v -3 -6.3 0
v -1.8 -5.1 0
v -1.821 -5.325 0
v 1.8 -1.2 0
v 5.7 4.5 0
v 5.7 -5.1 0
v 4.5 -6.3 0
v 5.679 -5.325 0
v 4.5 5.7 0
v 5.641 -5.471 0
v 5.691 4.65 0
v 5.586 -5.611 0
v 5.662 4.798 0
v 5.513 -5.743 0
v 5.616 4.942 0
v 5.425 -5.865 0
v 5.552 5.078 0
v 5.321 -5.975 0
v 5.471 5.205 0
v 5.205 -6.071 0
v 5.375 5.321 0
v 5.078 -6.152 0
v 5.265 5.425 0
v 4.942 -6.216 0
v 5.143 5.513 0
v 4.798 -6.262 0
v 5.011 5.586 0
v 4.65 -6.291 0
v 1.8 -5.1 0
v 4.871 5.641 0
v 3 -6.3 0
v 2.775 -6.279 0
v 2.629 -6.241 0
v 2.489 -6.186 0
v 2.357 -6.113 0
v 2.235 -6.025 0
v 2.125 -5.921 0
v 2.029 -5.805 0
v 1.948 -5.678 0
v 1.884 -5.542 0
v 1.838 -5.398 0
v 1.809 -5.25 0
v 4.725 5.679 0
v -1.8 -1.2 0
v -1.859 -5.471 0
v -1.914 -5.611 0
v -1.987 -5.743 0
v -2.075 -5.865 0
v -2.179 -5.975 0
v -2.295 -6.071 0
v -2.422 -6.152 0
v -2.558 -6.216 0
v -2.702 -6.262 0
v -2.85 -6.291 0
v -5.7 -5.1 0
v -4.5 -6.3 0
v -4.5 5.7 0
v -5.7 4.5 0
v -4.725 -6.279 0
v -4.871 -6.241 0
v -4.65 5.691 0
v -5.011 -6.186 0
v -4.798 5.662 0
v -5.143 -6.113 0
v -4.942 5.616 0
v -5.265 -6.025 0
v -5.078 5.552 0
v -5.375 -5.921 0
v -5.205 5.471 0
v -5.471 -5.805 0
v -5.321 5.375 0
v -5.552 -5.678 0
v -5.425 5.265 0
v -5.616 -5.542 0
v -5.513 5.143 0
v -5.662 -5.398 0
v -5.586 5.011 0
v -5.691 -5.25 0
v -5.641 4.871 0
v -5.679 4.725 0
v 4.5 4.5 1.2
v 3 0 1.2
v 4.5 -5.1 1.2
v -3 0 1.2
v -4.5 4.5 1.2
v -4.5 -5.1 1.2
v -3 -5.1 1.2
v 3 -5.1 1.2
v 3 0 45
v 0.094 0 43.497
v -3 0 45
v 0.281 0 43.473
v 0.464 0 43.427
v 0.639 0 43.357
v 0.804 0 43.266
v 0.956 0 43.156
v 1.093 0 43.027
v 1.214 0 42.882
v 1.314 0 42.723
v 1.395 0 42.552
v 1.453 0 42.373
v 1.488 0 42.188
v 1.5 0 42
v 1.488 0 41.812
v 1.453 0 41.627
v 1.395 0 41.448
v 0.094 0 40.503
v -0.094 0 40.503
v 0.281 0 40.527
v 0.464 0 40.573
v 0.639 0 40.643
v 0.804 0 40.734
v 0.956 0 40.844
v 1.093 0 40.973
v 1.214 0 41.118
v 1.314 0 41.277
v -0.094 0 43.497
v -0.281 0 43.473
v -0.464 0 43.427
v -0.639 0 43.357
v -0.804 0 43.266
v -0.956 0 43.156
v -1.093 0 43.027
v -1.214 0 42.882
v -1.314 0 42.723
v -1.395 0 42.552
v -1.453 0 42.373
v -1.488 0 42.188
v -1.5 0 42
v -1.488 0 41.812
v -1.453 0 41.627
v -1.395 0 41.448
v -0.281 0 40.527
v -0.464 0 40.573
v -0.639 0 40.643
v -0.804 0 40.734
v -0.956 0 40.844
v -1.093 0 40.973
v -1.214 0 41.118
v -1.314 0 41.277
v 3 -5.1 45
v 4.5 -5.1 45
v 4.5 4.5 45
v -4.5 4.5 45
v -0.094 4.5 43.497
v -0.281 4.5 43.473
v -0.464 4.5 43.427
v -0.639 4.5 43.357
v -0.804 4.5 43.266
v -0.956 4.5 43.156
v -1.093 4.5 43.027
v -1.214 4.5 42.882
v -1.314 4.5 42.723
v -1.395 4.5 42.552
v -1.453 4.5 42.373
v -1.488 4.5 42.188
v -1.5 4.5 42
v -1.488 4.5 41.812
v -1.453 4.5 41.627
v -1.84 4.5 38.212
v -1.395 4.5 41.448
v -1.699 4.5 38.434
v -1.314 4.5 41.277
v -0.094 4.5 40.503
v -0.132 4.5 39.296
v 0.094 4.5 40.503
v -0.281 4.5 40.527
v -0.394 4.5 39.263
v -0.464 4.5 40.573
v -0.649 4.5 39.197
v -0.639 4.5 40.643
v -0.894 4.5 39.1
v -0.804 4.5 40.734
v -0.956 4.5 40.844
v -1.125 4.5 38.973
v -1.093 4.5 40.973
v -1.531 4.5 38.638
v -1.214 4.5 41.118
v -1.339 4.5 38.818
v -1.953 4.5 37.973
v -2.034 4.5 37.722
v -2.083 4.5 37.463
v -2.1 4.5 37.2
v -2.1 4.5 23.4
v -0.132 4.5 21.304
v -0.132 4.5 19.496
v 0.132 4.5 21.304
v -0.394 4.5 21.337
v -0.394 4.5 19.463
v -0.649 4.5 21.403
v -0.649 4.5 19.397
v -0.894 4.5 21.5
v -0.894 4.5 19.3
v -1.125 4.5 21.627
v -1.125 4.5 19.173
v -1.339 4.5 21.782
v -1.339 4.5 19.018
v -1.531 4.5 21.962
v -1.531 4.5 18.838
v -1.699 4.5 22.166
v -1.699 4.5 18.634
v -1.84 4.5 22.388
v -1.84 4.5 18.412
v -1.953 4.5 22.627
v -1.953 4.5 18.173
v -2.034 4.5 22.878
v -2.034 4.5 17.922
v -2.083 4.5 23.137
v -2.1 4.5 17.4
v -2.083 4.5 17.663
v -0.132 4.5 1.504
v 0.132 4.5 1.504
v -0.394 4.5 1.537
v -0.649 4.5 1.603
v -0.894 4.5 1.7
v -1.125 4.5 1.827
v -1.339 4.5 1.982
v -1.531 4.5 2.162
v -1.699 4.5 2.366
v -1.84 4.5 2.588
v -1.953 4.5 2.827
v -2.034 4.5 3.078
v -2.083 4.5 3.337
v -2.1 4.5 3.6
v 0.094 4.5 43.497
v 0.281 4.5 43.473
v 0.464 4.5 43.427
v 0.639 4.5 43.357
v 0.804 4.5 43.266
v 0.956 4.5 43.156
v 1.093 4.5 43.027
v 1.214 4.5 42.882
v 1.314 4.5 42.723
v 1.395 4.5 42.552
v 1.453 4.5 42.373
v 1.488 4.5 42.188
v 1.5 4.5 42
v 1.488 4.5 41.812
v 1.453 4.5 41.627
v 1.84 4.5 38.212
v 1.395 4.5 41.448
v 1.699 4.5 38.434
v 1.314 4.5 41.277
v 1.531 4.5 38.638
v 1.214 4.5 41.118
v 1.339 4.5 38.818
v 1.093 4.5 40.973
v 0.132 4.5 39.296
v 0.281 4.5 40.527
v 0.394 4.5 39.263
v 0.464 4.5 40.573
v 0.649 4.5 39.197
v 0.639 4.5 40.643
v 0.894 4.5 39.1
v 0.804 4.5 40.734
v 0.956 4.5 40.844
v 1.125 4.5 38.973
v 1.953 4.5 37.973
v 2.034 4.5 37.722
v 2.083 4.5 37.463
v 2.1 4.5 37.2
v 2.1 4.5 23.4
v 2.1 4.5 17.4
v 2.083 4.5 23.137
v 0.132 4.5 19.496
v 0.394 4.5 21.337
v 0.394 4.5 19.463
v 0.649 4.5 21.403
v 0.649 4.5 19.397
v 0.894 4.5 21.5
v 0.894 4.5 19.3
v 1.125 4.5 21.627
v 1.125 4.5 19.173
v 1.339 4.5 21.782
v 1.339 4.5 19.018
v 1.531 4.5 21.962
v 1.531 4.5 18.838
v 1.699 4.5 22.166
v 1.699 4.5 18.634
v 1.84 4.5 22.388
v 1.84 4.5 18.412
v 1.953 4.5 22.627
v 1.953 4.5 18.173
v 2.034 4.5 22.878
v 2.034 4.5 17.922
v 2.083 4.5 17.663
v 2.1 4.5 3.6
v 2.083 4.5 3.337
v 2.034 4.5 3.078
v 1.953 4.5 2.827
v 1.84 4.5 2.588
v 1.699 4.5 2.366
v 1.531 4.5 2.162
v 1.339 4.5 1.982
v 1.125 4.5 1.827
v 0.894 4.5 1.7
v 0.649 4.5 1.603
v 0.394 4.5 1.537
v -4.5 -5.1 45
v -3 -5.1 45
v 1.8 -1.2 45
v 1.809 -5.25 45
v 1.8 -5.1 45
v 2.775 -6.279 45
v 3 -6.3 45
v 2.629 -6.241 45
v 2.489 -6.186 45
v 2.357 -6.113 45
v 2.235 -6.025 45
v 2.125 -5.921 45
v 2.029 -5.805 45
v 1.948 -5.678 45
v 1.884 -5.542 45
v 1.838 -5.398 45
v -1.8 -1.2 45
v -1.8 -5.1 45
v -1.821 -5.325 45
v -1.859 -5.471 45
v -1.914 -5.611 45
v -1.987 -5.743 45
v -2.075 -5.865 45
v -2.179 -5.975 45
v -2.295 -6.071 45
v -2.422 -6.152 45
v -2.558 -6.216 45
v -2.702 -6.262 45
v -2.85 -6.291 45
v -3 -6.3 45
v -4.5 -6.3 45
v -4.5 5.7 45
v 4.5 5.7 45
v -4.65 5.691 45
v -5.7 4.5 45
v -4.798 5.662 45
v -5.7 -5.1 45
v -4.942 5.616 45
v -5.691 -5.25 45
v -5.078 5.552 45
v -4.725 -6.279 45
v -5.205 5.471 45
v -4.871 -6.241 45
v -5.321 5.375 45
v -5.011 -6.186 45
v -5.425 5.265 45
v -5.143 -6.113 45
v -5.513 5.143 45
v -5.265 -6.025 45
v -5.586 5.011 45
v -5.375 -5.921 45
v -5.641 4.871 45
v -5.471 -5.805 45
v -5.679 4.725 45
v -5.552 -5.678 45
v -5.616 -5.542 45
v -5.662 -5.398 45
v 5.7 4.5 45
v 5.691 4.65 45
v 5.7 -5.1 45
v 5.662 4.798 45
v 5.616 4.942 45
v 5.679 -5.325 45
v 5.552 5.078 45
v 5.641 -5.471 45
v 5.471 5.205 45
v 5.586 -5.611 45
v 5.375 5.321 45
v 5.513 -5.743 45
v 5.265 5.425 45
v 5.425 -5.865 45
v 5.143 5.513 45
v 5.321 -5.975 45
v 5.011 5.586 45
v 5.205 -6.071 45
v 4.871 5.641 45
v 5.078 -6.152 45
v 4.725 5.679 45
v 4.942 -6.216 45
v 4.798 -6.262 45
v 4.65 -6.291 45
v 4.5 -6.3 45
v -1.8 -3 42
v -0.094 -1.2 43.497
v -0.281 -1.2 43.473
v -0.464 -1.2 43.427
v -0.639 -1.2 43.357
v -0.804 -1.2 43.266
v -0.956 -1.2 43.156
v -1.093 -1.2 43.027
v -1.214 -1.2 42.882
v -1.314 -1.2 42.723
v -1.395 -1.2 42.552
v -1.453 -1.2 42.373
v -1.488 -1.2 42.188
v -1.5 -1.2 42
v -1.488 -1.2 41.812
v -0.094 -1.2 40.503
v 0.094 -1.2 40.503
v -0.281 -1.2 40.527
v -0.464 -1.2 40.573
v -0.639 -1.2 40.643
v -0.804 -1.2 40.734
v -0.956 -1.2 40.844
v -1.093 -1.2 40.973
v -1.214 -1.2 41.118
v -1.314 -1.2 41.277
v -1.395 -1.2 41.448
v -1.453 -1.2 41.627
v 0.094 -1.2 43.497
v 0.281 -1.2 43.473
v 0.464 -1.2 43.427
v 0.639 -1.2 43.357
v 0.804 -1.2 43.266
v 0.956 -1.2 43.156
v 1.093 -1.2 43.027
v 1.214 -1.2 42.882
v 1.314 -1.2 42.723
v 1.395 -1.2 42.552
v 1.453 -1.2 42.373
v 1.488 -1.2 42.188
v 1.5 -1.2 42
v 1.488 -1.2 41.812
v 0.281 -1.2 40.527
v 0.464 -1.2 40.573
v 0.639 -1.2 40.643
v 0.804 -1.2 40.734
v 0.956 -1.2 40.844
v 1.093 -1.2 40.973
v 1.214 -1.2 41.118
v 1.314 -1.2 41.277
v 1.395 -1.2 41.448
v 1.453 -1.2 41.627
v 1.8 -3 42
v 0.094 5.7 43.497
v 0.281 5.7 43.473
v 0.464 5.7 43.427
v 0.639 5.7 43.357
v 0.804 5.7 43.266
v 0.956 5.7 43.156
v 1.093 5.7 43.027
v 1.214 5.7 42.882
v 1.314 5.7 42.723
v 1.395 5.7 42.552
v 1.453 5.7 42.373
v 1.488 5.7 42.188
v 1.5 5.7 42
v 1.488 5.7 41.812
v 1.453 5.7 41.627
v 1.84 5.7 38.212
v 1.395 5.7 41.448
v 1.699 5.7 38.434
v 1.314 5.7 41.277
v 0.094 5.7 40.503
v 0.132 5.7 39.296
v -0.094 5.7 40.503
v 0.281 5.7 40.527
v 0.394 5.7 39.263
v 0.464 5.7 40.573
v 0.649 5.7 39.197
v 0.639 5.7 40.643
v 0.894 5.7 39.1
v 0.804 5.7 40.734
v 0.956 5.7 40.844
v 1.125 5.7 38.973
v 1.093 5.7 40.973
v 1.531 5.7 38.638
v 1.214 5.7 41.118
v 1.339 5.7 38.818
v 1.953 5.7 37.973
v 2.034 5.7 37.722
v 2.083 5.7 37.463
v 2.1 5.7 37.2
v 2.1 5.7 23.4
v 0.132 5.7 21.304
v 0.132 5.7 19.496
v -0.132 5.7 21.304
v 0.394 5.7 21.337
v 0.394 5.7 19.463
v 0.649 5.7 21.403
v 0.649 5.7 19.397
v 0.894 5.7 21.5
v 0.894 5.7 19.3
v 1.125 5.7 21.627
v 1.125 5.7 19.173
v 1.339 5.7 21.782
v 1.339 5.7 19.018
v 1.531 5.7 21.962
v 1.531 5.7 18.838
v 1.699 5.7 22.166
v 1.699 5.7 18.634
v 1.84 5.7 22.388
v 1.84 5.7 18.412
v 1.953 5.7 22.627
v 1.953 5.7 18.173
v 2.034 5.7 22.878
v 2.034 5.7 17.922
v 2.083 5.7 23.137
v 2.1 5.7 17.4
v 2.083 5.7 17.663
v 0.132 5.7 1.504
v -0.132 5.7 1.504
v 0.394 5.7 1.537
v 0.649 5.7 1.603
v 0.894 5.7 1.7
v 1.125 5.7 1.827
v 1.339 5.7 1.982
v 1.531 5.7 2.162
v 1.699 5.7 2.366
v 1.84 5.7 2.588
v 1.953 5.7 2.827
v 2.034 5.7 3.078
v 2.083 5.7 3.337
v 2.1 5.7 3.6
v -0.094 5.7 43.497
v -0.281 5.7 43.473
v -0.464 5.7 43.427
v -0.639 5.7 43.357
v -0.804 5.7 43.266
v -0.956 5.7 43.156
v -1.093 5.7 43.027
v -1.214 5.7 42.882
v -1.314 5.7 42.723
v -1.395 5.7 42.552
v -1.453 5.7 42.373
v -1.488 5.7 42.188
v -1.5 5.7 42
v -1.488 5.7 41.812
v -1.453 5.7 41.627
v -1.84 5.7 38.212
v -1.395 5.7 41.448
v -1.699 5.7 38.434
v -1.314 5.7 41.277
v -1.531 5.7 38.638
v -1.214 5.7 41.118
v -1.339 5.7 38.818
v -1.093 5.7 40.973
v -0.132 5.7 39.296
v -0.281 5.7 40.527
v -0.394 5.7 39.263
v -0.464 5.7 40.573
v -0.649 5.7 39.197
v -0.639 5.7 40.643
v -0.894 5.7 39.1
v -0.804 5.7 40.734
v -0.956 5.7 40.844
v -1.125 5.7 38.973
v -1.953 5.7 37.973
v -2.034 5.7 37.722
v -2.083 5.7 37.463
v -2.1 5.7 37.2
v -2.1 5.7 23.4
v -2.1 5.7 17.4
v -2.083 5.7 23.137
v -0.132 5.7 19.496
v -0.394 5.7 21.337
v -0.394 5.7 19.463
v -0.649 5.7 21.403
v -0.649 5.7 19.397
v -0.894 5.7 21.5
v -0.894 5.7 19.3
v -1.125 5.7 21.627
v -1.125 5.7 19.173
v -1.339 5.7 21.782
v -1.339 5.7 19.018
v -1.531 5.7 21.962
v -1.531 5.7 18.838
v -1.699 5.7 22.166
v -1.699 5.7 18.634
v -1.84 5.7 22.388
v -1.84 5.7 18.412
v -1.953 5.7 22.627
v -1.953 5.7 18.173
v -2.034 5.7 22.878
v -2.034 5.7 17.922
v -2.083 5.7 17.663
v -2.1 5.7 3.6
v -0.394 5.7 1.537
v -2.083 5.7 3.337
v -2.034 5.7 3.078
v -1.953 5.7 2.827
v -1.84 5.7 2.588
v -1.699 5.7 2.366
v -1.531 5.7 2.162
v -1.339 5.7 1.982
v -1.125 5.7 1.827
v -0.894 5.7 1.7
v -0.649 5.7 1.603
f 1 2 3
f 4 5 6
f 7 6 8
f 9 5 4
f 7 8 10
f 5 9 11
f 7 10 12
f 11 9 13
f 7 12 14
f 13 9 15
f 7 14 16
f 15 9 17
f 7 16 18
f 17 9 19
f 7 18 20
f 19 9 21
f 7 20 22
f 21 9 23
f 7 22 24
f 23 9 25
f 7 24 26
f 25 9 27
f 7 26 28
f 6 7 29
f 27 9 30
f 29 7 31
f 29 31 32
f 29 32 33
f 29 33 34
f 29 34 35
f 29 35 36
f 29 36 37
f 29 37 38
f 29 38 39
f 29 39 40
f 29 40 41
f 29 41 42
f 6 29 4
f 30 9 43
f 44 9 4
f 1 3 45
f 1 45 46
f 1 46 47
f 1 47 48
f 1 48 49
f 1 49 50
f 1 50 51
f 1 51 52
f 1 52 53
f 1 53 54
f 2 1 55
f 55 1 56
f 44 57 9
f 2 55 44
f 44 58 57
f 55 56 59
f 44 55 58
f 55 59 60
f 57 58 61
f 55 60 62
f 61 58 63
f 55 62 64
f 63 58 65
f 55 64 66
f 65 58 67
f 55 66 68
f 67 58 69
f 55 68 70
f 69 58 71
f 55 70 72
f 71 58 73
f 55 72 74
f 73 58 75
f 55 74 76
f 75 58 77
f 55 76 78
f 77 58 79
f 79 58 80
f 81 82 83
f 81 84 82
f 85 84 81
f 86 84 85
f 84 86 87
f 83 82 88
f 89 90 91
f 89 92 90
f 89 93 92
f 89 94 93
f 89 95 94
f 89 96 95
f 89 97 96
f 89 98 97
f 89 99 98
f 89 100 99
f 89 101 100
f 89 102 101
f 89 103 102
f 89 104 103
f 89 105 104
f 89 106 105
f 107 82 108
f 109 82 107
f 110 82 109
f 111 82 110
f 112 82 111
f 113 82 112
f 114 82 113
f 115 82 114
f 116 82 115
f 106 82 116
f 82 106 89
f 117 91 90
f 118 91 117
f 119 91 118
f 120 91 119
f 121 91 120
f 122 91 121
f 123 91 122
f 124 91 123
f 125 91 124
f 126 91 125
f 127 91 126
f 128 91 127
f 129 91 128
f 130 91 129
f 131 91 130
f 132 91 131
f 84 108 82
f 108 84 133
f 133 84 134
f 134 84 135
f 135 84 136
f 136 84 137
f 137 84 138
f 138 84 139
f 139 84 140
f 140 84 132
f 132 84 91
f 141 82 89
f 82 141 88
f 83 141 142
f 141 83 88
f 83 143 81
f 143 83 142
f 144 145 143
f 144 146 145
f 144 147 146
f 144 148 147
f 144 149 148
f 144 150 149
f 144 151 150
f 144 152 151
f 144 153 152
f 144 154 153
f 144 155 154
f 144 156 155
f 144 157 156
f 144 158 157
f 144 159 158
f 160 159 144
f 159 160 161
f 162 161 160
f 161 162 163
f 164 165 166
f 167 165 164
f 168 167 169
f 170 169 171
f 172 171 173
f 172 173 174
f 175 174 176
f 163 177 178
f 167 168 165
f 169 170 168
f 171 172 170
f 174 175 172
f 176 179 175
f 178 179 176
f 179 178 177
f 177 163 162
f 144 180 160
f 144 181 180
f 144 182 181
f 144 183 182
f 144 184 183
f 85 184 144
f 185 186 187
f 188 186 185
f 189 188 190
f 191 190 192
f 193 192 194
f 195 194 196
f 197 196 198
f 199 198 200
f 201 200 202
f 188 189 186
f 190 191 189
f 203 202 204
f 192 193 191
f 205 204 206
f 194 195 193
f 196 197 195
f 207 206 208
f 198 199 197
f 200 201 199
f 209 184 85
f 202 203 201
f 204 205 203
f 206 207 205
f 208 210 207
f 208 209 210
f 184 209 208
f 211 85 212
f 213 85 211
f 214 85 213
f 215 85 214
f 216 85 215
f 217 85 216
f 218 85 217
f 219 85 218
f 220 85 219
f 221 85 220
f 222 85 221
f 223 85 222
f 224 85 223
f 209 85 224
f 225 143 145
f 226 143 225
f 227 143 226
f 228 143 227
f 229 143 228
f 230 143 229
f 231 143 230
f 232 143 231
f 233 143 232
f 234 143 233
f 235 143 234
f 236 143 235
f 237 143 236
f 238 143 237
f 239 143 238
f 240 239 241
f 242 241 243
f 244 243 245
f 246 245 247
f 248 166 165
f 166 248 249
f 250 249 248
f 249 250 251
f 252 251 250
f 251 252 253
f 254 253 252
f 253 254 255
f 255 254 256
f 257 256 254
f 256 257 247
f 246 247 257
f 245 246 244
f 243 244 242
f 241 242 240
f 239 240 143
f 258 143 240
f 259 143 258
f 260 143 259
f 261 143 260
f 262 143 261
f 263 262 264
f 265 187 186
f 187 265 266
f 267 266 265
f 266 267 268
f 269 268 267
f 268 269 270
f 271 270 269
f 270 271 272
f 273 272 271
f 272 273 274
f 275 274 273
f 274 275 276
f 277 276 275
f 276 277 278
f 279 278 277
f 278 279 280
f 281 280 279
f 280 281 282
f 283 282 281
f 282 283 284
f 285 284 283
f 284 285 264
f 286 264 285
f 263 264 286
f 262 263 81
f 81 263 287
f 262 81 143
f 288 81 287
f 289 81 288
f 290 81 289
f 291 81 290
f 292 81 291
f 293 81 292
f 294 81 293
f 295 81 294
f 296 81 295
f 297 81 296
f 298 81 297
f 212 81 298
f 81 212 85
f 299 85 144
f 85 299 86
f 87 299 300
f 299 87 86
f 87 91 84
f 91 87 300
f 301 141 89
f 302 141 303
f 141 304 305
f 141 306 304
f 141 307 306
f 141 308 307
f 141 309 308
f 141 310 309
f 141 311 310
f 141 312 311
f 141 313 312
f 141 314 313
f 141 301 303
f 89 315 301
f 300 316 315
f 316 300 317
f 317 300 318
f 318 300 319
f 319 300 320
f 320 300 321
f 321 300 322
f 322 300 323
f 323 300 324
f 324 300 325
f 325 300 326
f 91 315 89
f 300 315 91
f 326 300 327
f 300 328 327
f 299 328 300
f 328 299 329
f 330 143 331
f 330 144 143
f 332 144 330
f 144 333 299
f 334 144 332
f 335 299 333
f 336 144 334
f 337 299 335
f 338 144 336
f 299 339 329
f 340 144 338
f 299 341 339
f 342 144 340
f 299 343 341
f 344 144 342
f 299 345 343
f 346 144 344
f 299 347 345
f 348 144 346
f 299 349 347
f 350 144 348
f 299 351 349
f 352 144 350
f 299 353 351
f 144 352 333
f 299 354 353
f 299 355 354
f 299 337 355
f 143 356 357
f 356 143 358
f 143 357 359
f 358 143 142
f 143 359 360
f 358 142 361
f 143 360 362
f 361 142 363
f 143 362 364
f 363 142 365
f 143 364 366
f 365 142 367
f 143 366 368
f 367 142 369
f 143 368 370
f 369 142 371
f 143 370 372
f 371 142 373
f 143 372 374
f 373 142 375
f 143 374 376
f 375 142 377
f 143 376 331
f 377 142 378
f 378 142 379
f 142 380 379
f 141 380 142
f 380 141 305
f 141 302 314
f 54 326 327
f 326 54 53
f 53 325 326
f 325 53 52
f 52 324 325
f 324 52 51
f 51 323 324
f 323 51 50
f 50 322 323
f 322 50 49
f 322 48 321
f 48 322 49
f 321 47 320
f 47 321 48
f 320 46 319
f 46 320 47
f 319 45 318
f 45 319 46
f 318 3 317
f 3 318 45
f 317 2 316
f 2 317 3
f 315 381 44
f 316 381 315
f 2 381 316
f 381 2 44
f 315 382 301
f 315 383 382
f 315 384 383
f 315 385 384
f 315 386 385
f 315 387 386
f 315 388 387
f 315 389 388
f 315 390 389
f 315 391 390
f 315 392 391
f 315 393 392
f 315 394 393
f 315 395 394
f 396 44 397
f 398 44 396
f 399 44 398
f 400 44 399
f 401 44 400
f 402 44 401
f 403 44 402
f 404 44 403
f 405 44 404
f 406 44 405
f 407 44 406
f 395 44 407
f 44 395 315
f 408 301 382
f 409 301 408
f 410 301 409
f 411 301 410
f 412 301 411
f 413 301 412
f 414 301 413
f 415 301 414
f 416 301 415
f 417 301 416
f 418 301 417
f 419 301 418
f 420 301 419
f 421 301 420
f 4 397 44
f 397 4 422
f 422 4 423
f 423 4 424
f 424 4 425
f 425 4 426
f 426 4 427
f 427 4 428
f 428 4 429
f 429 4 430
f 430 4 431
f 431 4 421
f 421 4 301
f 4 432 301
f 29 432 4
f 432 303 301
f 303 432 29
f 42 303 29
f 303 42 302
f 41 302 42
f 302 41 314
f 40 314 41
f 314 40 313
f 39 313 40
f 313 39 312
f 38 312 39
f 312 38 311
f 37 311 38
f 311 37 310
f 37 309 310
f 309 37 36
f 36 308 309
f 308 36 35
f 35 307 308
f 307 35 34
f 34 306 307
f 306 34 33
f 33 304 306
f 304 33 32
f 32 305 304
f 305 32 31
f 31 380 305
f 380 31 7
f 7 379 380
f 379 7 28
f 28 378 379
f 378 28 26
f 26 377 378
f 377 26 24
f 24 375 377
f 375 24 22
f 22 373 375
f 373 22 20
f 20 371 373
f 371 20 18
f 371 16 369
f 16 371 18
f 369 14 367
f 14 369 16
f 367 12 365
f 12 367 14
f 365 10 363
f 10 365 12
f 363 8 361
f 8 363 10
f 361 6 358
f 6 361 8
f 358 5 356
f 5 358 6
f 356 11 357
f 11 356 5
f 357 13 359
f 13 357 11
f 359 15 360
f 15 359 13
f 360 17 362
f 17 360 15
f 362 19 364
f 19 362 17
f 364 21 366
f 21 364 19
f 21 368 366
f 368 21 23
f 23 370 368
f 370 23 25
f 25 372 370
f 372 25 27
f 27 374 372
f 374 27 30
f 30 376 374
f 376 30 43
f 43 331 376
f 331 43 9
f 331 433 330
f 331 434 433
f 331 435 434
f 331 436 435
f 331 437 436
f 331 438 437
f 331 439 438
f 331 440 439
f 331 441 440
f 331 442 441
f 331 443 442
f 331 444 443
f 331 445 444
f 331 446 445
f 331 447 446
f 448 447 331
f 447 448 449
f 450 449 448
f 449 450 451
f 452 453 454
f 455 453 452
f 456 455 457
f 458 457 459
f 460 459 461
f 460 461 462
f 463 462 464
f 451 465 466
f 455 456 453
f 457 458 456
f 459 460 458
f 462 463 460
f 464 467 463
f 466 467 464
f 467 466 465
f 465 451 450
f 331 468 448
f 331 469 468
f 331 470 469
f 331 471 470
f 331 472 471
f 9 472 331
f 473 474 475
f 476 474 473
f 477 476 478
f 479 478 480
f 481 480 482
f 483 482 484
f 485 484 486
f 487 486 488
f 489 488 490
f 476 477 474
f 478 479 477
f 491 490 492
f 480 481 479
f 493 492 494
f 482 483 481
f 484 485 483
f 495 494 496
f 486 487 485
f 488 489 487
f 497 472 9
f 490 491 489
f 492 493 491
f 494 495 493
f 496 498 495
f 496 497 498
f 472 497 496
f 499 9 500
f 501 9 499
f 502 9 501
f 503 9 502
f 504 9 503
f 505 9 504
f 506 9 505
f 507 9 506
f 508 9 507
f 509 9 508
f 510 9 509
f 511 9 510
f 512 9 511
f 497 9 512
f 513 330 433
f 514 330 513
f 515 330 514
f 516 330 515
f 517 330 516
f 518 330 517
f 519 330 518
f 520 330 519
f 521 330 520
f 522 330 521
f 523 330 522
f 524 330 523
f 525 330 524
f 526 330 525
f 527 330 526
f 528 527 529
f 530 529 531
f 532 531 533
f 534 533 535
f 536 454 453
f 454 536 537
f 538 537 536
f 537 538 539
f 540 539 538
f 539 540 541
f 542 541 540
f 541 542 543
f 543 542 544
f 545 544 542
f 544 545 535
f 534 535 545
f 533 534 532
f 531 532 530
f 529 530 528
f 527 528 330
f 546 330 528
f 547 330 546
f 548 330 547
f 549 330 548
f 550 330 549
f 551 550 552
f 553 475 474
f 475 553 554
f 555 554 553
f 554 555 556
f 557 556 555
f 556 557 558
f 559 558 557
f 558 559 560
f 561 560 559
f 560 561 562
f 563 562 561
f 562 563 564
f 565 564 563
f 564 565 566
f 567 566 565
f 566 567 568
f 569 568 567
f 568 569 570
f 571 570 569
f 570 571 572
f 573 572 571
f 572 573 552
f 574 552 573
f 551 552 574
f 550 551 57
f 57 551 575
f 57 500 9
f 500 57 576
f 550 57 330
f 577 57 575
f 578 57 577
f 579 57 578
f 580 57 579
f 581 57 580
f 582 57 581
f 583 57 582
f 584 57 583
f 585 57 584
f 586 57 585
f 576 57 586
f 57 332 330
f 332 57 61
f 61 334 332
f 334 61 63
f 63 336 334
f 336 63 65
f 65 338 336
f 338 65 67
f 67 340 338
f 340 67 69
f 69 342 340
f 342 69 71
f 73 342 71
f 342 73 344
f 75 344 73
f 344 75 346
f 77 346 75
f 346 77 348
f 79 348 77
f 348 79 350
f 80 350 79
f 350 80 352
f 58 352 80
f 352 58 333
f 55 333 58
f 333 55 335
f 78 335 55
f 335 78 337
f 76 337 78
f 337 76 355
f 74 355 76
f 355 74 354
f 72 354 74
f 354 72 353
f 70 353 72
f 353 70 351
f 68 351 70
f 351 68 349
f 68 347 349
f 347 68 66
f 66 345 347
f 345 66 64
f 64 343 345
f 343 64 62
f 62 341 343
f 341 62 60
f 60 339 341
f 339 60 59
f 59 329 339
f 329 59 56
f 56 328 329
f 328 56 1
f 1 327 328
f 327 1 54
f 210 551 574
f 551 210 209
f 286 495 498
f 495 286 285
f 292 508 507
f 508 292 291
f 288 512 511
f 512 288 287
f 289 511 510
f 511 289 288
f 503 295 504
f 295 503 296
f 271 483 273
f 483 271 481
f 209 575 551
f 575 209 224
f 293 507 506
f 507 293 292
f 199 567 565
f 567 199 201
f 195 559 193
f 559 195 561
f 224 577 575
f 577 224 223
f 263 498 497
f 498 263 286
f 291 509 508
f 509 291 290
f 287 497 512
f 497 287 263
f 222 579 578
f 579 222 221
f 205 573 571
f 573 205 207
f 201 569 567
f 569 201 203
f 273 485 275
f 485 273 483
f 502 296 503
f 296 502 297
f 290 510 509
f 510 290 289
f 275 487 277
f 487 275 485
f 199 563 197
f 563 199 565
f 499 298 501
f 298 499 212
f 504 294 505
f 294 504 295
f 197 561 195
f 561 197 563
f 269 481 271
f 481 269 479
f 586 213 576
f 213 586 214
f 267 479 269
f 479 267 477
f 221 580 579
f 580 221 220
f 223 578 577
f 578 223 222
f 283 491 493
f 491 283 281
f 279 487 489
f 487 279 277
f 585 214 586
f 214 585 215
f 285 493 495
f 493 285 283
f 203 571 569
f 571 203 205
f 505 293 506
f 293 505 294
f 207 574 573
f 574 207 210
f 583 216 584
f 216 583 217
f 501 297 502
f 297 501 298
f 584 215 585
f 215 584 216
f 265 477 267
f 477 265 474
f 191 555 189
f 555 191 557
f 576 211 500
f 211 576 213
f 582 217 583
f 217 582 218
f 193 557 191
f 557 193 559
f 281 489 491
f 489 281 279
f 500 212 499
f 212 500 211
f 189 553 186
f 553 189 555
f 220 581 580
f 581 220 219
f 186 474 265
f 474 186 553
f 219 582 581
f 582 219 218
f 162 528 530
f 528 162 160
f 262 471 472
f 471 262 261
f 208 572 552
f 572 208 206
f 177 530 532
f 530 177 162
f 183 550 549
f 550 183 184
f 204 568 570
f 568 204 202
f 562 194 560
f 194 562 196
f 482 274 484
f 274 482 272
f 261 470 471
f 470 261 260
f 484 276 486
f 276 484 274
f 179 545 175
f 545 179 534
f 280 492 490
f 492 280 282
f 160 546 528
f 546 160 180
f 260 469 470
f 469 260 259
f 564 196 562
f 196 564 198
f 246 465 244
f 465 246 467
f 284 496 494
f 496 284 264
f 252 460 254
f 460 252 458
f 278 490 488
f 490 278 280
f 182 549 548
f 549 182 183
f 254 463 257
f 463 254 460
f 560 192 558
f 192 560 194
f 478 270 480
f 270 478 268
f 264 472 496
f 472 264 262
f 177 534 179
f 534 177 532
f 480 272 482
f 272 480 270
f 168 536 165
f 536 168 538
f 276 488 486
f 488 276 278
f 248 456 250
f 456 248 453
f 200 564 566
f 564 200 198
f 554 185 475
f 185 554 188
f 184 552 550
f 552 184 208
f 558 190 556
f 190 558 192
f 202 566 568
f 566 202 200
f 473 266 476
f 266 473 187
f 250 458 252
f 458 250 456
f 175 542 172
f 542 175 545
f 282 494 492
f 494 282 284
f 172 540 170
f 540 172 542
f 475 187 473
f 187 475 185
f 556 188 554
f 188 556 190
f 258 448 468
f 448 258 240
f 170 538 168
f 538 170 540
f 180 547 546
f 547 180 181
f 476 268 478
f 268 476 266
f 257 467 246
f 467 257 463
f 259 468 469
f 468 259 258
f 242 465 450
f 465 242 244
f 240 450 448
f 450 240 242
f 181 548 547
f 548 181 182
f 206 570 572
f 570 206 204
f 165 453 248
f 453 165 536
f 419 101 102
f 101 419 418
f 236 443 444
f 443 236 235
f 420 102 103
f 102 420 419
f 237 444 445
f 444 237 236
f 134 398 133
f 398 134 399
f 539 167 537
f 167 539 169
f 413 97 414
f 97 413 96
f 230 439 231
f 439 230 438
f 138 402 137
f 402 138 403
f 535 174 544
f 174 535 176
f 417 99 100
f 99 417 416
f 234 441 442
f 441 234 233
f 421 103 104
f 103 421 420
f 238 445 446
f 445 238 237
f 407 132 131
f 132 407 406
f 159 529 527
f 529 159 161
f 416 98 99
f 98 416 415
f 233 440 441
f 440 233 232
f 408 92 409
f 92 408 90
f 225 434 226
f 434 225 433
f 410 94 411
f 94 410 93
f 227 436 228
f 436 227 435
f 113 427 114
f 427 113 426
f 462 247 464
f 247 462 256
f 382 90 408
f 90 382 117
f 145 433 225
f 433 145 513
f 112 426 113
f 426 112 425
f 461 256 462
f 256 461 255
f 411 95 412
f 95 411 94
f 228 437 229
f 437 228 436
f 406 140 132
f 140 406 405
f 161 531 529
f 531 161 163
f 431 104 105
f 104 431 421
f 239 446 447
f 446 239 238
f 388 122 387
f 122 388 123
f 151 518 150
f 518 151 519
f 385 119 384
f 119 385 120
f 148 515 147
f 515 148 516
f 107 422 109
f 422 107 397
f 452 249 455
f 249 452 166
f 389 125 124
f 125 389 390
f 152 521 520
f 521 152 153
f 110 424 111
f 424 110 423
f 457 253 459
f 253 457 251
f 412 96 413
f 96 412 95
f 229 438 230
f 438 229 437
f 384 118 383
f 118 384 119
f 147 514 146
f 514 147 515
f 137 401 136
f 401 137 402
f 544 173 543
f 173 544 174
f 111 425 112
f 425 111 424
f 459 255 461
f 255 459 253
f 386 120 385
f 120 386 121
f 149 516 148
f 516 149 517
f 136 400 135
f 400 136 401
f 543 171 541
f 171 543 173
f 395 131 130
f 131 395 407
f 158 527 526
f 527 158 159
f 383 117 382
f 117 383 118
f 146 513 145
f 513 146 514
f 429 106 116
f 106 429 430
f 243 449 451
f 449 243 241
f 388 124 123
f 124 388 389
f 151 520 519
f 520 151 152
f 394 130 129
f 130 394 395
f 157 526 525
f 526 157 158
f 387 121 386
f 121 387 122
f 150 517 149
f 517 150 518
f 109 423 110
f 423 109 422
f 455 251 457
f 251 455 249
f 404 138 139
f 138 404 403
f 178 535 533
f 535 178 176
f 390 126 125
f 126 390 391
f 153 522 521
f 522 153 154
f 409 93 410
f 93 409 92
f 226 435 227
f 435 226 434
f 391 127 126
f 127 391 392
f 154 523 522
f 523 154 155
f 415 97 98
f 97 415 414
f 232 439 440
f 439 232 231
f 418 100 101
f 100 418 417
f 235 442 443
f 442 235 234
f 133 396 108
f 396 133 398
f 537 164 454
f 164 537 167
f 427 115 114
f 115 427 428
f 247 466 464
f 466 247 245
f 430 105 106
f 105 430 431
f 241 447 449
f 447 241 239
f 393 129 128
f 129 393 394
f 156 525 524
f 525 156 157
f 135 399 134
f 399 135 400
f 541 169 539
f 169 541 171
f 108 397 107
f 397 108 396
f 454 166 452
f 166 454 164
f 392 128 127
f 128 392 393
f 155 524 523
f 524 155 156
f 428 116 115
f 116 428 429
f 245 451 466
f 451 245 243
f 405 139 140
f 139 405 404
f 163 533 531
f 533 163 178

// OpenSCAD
// file: ../Functions/Math/ceilMultiple.scad
/**
 * Aproxima el valor especificado al múltiplo superior
 * más cercano del valor de referencia.
 * Su principal uso es aproximar por exceso un valor a
 * un `layerHeight` superior para dejar margen.
 *
 * @param value Valor a aproximar.
 * @param ref   Valor a usar como referencia.
 *
 * @author  Joaquín Fernández
 * @license CC-BY-NC-4.0
 * @url     https://gitlab.com/joaquinfq/openscad/blob/master/Functions/ceilMultiple.scad
 */
function ceilMultiple(value, ref) = ceil(value / ref) * ref;
// main file
/*
 * Soporte para almacenar circuitos integrados.
 *
 * @author  Joaquín Fernández
 * @url     https://gitlab.com/joaquinfq/openscad/blob/master/Electronics/IC-Holder.scad
 * @license CC-BY-NC-4.0
 * @see     http://www.thingiverse.com/thing:2071264
 */
use <../Functions/Math/ceilMultiple.scad>
/*
 * Dimensiones de los diferentes tipos de ICs.
 *
 *    |----w1----|
 *     __________
 *    |          |
 * h1 |          | 
 *    |   ____   |
 *    |  |    |  |
 * h2 |  |    |  |
 *    |__|-w2-|__|
 */
types = [
    // Nombre             h1   h2    w1   w2
    [ "DIP4",             3.9, 4.2,  7.8, 7.2 ], // 0
    [ "DIPSwitch",        7.0, 3.3, 10.0, 8.0 ], // 1
    [ "DPDT4Pin-6x6x4",   4.5, 3.6,  7.5, 6.3 ], // 2
    [ "DPDT6Pin-7x7x12", 13.0, 3.6,  7.0, 4.7 ], // 3
    [ "BarDisplay",       7.8, 7.8, 25.6, 1.8 ]  // 4
];
//------------------------------------------
// Variables configurables.
//------------------------------------------
// Tipo seleccionado, usado para obtener las medidas del
// array `types`.
type = 0;
// Valor del `layer height` a usar.
lh = 0.3;
// Cantidad de soportes
n = 1;
// Altura.
l = ceilMultiple(45, lh);//w37xl52xh45
// Diámetro del pin, M3 por defecto.
d = 3;
// Grosor de las paredes
f = 4 * lh;
// Indica si se agregan las ranuras en la parte superior.
// Ver comentarios en el módulo `slot` para asignar su valor.
slotSize  = 0;
// Cantidad de lados del polígono a dibujar en el slot.
// Se usa si slotSize > 0.
slotSides = 50;
//------------------------------------------
// Variables calculadas a partir del tipo.
//------------------------------------------
// Altura del cuerpo del IC
h1 = ceilMultiple(types[type][1], lh) + 2 * lh;
// Altura de las patas del IC
h2 = ceilMultiple(types[type][2], lh) + 2 * lh;
// Anchura externa
w1 = ceilMultiple(types[type][3], lh) + 4 * lh;
// Anchura interna.
w2 = ceilMultiple(types[type][4], lh) - 4 * lh;
// Ruta a dibujar.
path = [
    [ - w1 / 2, - h2 ],
    [ - w1 / 2,   h1 ],
    [   w1 / 2,   h1 ],
    [   w1 / 2, - h2 ],
    [   w2 / 2, - h2 ],
    [   w2 / 2,    0 ],
    [ - w2 / 2,    0 ],
    [ - w2 / 2, - h2 ]
];
/**
 * Dibuja el soporte.
 */
module holder()
    {
    difference()
    {
        union()
        {
            linear_extrude(f)
            {
                polygon(path);
            }
            linear_extrude(l)
            {
                difference()
                {
                    offset(r = f)
                    {
                        polygon(path);
                    }
                    polygon(path);
                }
            }
        }
        if (slotSize >= 0)
        {
            maxLength = l - ceilMultiple(d, lh);
            slots     = ceil(maxLength / 30);
            sl        = floor(maxLength / slots);
            for (i = [ 0 : slots - 1 ])
            {
                translate([ 0, h1 + f / 2, (sl - f) * i + f ])
                {
                    slot(sl - (slots == 1 ? 3 * f : 2 * f), slotSize);
                }
            }
        }
        translate([ 0, h1 + f + lh, l - d ])
        {
            rotate([ 90, 0, 0 ])
            {
                difference()
                {
                    pin();
                }
            }
        }
    }
}
/**
 * Dibuja el pin para evitar que se salgan los ICs.
 *
 * @param {Number} tolerance Valor a usar para modificar las
 *                           dimensiones del pin y dejar holgura.
 */
module pin(tolerance = 0)
{
    _d  = min(d + tolerance, w2 - 2 * (f + lh), l - 2 * (f + lh));
    if (_d >= 1.75)
    {
        _dm = _d + 2 * f;
        _dx = _dm / 2 - _d * 0.25;
        difference()
        {
            union()
            {
                translate([ 0, 0, - f / 2 - lh ])
                {
                    cylinder(d = _dm, h = f);
                }
                cylinder(d = _d, h = h1 + 2.5 * f);
                translate([ 0, 0, h1 + 2.5 * f + _d / 2 ])
                {
                    scale([ 1.2, 1.2, 1.75 ])
                    {
                        sphere(d = _d);
                    }
                }
            }
        }
    }
}
/**
 * Dibuja las ranuras de la parte superior para ver el código del IC.
 *
 * @param {Number} length Longitud del slot.
 * @param {Number} side   Valor del lado del polígono a usar
 *                        para dibujar la superficie.
 *                        Si es 0, se usa una ranura redondeada.
 *                        Si es < 0, no se crea la ranura.
 */
module slot(length, side = 0)
{
    if (side > 0)
    {
        _w  = w1 - f;
        _nx = floor(_w / (side + 2 * lh));
        _nz = floor(length / (side + 2 * lh));
        if (_nx && _nz)
        {
            _dx = (_w - side * _nx) / _nx;
            _dz = (length - side * _nz) / _nz;
            for (_x = [ 0 : _nx - 1 ])
            {
                for (_z = [ 0 : _nz - 1 ])
                {
                    translate([
                        - _w / 2 - 2 * lh + _x * (side + _dx) + _dx + f,
                        0,
                        _z * (side + _dz) + _dz + f 
                    ])
                    {
                        rotate([ 90, 0, 0 ])
                        {
                            cylinder(d = side, h = 2 * f, center = true, $fn = slotSides);
                        }
                    }
                }
            }
        }
    }
    else if (side == 0)
    {
        _w = w1 - 4 * f;
        _y = ceilMultiple(_w / 2, lh);
        rotate([ 90, 0, 0 ])
        {
            hull()
            {
                for (_i = [ -1, 1 ])
                {
                    translate([ 0, _i == -1 ? length - _y : _y, - h1 / 2 ])
                    {
                        cylinder(d = _w, h = h1);
                    }
                }
            }
        }
    }
}
//---------------------------------------------------
$fn = 50;
// n = floor(45 / (w1 + f));
for (x = [ 0 : n - 1 ])
{
    translate([ x * (w1 + f), 0, 0 ])
    {
        holder();
    }
}
// Recordar escalar el pin para que entre sin problemas.
//pin();
